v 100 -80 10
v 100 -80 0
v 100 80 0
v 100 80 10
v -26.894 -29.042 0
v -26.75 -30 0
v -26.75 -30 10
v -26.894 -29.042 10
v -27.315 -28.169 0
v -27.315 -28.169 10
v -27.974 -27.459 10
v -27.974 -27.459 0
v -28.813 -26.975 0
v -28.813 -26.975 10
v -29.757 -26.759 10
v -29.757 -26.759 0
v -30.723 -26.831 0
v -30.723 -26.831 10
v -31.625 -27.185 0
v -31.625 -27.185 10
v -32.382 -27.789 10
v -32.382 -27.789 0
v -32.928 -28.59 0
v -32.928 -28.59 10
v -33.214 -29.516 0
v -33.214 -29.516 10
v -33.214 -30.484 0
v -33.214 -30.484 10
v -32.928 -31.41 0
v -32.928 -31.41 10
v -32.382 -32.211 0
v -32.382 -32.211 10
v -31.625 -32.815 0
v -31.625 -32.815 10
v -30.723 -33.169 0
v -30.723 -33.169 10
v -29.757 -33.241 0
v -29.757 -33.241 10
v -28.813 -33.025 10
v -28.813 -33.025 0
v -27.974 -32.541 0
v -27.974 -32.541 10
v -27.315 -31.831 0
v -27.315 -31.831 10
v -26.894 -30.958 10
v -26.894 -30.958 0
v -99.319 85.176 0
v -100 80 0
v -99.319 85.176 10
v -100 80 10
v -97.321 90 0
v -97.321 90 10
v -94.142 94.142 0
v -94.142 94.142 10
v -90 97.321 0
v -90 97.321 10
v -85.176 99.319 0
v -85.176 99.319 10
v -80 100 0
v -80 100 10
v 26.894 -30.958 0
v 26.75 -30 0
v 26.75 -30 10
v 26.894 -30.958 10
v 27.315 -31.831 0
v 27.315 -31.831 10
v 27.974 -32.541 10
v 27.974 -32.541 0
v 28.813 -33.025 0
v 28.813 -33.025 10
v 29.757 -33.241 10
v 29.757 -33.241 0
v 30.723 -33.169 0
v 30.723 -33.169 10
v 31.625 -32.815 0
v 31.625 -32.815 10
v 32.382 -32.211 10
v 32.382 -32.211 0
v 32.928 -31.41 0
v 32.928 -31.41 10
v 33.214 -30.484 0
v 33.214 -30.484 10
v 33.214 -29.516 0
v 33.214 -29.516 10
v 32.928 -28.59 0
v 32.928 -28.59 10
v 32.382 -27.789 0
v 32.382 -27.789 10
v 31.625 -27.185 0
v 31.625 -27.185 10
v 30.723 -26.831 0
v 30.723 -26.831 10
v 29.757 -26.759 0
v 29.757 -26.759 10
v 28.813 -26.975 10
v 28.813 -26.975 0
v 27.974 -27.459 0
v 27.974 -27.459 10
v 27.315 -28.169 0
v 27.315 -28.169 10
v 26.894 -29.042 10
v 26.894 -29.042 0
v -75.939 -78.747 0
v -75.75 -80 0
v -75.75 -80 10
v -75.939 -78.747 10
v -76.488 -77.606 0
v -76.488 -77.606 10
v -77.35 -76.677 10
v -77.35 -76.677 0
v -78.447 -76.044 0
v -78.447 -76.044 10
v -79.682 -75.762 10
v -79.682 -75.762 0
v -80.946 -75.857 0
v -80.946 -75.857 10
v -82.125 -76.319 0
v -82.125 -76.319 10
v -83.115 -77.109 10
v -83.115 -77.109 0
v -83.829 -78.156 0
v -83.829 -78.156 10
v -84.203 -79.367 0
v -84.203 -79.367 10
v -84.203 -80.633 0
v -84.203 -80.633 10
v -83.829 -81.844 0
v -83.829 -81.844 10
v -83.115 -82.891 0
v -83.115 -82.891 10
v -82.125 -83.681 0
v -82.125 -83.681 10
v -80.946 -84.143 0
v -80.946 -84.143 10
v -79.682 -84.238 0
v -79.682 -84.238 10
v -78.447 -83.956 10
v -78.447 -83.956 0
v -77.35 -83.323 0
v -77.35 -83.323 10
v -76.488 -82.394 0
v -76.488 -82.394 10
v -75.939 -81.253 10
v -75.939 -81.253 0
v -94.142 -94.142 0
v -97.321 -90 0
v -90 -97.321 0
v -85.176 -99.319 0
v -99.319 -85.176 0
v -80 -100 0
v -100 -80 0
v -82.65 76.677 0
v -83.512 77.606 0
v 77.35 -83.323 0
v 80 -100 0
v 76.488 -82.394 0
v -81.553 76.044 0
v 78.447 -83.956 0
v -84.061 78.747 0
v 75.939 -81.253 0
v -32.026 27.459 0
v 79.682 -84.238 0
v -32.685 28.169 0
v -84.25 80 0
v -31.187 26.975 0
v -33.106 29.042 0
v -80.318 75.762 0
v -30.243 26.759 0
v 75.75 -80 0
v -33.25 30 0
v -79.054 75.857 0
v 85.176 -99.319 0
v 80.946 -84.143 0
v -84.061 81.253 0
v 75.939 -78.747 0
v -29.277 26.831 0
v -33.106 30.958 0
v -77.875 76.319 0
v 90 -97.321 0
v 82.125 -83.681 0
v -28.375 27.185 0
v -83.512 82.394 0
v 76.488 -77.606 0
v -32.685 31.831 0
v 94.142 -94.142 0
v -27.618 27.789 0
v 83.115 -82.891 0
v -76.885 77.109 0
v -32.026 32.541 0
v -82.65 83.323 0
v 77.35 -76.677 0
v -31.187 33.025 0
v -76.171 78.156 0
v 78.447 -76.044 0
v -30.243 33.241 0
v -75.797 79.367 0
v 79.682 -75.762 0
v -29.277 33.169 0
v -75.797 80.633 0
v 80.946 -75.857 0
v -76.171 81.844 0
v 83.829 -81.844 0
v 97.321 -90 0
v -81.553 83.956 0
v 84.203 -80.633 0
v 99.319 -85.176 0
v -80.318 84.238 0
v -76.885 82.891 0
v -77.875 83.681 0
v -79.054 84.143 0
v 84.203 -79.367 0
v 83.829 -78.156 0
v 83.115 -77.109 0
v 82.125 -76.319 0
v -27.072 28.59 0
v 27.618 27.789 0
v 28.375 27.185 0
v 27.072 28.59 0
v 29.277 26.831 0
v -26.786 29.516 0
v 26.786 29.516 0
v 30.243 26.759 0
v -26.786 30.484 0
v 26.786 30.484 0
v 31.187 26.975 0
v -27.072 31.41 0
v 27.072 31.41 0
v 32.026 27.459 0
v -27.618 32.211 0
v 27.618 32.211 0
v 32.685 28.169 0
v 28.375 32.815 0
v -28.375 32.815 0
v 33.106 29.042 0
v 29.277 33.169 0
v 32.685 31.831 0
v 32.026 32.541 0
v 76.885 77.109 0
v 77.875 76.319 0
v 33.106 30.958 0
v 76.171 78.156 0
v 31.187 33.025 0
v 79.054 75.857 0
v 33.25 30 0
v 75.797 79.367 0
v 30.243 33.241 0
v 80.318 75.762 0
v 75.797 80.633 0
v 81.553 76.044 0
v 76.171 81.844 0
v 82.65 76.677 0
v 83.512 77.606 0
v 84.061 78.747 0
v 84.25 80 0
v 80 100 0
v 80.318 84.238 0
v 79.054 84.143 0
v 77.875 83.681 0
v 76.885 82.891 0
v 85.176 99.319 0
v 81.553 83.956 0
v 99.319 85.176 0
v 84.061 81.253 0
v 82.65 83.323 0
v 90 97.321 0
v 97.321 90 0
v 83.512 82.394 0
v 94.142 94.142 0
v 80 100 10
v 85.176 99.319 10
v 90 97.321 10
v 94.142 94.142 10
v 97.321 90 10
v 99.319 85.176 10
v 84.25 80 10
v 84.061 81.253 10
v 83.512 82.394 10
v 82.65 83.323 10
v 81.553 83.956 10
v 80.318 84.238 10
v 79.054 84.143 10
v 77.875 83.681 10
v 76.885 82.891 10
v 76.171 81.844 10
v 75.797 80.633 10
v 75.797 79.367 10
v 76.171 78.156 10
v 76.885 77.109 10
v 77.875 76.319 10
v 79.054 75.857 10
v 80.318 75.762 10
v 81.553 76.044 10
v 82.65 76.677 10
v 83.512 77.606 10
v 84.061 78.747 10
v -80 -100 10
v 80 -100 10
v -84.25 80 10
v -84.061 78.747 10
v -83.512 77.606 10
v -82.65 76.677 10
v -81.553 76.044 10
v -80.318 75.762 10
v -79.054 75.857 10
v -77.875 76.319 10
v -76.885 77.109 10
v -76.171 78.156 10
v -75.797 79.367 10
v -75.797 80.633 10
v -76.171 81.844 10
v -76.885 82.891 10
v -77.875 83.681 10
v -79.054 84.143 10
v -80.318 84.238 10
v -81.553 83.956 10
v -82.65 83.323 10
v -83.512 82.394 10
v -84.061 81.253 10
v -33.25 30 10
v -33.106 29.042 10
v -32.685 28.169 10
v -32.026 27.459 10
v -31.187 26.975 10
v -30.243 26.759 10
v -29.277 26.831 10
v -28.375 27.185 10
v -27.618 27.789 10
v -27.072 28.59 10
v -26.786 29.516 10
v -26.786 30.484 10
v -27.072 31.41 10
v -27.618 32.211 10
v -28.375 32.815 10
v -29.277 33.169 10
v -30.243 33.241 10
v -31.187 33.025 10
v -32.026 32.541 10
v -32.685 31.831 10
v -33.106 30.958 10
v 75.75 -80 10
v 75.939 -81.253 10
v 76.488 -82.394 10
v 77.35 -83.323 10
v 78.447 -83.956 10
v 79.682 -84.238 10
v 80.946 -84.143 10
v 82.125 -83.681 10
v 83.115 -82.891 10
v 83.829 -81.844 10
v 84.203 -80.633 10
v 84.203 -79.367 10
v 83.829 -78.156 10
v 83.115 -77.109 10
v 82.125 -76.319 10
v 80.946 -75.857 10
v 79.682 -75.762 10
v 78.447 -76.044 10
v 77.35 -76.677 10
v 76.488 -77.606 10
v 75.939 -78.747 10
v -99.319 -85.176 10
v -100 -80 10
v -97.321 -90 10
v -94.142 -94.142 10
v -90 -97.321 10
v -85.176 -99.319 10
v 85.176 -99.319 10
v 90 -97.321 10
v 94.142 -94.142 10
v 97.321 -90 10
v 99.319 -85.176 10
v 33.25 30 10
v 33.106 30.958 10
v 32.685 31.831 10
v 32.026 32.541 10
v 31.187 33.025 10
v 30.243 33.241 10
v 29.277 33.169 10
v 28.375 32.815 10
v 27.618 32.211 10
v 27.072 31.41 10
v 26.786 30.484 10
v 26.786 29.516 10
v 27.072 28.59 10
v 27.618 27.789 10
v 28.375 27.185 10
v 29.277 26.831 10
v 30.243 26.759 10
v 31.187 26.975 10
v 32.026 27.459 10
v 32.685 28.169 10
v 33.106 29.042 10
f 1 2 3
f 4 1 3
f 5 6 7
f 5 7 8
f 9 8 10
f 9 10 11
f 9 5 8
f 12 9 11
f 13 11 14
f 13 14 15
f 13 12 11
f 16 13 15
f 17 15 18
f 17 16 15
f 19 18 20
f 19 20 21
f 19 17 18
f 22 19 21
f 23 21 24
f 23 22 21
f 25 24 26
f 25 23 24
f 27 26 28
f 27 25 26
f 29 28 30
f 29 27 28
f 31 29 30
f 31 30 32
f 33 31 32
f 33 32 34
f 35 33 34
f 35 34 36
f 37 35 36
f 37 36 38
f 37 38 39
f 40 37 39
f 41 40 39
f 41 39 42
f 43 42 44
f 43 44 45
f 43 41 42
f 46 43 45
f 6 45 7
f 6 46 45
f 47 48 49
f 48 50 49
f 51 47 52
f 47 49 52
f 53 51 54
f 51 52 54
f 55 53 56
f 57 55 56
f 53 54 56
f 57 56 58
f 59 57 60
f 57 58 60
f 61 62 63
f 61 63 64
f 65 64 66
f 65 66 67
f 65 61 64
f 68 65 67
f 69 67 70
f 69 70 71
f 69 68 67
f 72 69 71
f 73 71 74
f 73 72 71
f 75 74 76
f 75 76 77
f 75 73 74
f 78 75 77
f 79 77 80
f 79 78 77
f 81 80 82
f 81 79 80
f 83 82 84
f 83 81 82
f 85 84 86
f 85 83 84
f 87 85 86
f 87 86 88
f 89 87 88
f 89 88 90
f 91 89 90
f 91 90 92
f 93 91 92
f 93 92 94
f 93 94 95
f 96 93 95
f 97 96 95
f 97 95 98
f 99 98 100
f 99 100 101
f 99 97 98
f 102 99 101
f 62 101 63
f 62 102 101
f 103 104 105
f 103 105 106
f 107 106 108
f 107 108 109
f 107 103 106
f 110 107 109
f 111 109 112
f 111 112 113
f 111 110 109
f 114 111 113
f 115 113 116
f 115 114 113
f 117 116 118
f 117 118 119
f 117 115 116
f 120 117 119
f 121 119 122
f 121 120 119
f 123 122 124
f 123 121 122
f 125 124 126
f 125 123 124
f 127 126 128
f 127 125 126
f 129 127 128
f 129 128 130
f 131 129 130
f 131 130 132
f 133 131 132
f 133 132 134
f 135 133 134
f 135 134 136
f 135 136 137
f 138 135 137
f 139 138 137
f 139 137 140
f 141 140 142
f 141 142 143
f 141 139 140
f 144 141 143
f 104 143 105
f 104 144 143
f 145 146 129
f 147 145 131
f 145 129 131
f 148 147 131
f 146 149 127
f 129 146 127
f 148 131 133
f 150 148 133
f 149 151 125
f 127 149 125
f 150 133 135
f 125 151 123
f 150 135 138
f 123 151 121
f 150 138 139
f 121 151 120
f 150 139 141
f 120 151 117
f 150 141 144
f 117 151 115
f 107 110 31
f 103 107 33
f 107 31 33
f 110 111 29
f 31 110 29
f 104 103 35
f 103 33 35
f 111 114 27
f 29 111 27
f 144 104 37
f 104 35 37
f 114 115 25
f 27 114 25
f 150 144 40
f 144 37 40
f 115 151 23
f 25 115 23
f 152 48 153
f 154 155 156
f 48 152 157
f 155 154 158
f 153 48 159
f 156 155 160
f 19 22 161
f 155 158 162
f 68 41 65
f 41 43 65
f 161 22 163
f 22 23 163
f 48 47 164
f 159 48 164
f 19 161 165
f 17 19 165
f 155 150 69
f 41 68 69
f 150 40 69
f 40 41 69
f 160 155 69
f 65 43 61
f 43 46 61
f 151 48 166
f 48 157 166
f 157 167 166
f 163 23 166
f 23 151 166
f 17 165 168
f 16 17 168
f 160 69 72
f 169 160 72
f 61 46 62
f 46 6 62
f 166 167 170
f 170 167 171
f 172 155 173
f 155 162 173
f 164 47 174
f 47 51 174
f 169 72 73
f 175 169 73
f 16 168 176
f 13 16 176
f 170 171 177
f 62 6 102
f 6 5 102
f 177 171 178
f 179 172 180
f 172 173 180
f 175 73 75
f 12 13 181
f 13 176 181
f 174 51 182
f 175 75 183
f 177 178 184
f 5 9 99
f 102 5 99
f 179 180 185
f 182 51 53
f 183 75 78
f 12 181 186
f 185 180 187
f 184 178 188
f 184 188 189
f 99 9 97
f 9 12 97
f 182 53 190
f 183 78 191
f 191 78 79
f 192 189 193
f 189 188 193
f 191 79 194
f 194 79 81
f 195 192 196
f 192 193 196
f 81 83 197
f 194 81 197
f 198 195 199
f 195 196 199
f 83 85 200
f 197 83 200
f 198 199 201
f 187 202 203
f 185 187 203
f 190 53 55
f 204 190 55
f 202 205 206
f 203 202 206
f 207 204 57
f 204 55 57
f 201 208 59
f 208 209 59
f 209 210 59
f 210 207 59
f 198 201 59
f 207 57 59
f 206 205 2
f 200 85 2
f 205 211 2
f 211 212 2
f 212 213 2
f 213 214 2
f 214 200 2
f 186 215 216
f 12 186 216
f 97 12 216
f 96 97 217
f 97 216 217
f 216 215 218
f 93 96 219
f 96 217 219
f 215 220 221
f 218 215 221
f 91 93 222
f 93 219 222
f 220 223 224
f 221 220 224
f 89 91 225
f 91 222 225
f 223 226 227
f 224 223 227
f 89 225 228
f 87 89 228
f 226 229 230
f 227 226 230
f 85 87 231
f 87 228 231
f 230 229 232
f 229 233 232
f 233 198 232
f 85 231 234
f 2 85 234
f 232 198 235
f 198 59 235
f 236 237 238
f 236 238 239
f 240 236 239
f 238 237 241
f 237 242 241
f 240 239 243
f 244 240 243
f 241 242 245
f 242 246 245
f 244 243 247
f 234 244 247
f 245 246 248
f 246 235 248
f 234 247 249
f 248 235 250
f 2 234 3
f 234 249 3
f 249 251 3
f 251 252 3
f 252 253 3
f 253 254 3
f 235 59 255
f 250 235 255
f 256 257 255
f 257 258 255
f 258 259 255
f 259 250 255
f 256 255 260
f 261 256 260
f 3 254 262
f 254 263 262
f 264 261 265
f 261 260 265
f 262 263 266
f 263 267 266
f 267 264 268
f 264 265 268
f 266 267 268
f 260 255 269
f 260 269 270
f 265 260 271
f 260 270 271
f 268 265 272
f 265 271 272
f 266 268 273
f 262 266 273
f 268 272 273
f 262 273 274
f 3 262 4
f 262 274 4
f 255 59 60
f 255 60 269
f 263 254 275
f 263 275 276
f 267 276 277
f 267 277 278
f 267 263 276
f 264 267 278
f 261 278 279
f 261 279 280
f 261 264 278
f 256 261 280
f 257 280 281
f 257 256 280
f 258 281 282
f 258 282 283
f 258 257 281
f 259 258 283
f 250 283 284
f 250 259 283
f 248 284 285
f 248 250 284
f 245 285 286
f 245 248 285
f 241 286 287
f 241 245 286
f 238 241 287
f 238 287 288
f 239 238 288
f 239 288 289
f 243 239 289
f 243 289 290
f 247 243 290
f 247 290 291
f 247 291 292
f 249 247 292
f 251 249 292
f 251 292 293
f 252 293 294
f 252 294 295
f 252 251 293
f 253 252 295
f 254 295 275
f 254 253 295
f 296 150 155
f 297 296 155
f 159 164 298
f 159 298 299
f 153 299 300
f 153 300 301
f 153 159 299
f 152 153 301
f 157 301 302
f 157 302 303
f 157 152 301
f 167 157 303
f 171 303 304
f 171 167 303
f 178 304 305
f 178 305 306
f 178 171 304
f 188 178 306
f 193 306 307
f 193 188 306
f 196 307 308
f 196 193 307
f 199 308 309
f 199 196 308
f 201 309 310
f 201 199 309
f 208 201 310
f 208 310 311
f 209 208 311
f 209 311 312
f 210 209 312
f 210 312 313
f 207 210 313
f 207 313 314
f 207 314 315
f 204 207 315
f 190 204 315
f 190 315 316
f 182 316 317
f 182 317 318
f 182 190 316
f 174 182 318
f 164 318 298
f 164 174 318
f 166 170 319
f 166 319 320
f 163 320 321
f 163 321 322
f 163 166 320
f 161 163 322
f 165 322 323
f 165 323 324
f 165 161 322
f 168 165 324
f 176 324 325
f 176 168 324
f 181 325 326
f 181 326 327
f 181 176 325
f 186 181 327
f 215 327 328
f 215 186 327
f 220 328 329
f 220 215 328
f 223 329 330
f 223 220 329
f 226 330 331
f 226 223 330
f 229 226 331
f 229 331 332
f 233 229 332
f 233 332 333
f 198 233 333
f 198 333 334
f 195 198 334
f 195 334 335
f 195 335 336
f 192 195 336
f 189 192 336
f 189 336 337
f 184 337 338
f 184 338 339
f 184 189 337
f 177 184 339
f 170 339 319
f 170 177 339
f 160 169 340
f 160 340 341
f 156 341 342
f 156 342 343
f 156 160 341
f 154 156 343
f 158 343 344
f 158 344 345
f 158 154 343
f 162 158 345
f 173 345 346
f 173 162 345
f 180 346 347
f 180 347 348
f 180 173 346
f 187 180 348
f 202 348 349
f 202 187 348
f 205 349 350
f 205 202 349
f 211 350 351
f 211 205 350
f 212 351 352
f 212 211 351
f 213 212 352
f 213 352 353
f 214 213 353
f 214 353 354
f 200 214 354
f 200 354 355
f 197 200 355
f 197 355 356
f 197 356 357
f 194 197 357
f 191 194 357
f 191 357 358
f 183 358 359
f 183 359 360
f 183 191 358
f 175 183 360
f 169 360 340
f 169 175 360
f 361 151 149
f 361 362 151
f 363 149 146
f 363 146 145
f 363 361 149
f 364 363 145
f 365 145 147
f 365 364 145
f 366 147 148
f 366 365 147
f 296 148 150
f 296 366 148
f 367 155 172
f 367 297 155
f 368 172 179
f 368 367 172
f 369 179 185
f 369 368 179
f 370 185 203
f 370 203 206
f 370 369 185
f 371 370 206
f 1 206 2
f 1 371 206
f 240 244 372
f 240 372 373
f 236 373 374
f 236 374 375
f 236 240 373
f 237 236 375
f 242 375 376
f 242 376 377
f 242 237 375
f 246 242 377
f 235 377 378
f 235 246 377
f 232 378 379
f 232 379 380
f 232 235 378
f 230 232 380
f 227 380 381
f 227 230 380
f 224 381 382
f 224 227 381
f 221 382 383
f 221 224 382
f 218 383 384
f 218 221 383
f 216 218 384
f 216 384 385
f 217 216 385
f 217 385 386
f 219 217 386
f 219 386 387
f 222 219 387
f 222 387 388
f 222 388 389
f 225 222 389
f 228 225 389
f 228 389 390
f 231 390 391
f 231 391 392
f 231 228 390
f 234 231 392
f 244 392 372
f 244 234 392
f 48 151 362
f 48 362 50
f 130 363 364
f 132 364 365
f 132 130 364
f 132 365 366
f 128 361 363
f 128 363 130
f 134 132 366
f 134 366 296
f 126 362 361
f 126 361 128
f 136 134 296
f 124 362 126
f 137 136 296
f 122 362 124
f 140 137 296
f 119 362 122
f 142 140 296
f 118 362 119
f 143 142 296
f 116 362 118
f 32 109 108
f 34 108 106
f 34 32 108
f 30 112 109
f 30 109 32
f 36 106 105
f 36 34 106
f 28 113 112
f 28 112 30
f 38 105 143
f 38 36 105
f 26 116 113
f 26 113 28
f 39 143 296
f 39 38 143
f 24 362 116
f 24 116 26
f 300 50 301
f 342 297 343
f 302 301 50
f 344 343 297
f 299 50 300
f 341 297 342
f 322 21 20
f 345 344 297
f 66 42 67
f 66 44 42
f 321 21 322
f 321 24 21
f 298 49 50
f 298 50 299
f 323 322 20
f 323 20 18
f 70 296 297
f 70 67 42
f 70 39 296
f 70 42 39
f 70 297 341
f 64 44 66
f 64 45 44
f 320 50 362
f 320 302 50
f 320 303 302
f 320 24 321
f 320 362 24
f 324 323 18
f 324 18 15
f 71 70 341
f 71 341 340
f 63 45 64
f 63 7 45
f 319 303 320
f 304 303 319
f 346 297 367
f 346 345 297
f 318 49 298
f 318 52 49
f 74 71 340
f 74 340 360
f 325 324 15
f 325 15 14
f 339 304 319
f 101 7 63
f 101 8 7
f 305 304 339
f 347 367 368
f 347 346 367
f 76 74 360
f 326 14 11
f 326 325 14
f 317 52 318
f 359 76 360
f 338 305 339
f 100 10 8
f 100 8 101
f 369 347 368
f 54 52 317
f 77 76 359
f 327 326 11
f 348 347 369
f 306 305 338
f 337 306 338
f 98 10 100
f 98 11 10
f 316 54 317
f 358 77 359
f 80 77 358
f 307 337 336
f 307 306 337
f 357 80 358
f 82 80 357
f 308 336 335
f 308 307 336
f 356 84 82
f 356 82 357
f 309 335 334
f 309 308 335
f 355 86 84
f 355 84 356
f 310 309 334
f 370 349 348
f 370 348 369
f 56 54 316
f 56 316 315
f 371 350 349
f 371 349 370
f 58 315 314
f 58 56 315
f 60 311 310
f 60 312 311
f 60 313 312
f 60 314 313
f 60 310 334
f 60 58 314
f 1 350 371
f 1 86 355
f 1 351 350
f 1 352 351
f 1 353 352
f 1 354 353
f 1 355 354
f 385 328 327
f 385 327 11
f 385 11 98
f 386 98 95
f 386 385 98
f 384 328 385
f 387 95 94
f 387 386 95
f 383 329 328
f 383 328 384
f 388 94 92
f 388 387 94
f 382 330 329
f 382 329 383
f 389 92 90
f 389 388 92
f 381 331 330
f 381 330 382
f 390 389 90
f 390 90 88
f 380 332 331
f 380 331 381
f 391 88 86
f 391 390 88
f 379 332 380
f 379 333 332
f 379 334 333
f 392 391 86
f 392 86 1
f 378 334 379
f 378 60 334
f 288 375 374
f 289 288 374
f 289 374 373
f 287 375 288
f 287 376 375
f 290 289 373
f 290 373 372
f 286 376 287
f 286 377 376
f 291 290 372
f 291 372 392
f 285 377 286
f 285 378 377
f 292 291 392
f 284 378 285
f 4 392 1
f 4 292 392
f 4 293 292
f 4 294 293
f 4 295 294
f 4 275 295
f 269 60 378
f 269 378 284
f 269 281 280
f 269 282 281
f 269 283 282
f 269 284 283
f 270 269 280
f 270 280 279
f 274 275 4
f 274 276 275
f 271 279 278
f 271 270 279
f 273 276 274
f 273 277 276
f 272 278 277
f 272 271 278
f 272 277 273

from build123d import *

# Parameters (mm, degrees)
SKETCH_1_W      = 200
SKETCH_1_H      = 200
SKETCH_1_R      = 3.25
SKETCH_1_R_2    = 4.25
EXTRUDE_1_DEPTH = 10
FILLET_1_R      = 20


with BuildPart() as part:
    # 草图1 → 凸台-拉伸1 (new body)
    with BuildSketch(Plane.XY):
        Rectangle(SKETCH_1_W, SKETCH_1_H)
        with Locations((30, 30)):
            Circle(SKETCH_1_R, mode=Mode.SUBTRACT)
        with Locations(Location((30, -30, 0), (0, 0, 180))):
            Circle(SKETCH_1_R, mode=Mode.SUBTRACT)
        with Locations(Location((-30, 30, 0), (0, 0, 180))):
            Circle(SKETCH_1_R, mode=Mode.SUBTRACT)
        with Locations((-30, -30)):
            Circle(SKETCH_1_R, mode=Mode.SUBTRACT)
        with Locations((80, 80)):
            Circle(SKETCH_1_R_2, mode=Mode.SUBTRACT)
        with Locations(Location((80, -80, 0), (0, 0, 180))):
            Circle(SKETCH_1_R_2, mode=Mode.SUBTRACT)
        with Locations((-80, -80)):
            Circle(SKETCH_1_R_2, mode=Mode.SUBTRACT)
        with Locations(Location((-80, 80, 0), (0, 0, 180))):
            Circle(SKETCH_1_R_2, mode=Mode.SUBTRACT)
    extrude(amount=EXTRUDE_1_DEPTH)

    # 圆角1
    fillet_1_edges = [part.edges().sort_by_distance(p)[0] for p in [
        (-100, 100, 5),
        (-100, -100, 5),
        (100, -100, 5),
        (100, 100, 5),
    ]]
    fillet(fillet_1_edges, radius=FILLET_1_R)


solid = part.part
